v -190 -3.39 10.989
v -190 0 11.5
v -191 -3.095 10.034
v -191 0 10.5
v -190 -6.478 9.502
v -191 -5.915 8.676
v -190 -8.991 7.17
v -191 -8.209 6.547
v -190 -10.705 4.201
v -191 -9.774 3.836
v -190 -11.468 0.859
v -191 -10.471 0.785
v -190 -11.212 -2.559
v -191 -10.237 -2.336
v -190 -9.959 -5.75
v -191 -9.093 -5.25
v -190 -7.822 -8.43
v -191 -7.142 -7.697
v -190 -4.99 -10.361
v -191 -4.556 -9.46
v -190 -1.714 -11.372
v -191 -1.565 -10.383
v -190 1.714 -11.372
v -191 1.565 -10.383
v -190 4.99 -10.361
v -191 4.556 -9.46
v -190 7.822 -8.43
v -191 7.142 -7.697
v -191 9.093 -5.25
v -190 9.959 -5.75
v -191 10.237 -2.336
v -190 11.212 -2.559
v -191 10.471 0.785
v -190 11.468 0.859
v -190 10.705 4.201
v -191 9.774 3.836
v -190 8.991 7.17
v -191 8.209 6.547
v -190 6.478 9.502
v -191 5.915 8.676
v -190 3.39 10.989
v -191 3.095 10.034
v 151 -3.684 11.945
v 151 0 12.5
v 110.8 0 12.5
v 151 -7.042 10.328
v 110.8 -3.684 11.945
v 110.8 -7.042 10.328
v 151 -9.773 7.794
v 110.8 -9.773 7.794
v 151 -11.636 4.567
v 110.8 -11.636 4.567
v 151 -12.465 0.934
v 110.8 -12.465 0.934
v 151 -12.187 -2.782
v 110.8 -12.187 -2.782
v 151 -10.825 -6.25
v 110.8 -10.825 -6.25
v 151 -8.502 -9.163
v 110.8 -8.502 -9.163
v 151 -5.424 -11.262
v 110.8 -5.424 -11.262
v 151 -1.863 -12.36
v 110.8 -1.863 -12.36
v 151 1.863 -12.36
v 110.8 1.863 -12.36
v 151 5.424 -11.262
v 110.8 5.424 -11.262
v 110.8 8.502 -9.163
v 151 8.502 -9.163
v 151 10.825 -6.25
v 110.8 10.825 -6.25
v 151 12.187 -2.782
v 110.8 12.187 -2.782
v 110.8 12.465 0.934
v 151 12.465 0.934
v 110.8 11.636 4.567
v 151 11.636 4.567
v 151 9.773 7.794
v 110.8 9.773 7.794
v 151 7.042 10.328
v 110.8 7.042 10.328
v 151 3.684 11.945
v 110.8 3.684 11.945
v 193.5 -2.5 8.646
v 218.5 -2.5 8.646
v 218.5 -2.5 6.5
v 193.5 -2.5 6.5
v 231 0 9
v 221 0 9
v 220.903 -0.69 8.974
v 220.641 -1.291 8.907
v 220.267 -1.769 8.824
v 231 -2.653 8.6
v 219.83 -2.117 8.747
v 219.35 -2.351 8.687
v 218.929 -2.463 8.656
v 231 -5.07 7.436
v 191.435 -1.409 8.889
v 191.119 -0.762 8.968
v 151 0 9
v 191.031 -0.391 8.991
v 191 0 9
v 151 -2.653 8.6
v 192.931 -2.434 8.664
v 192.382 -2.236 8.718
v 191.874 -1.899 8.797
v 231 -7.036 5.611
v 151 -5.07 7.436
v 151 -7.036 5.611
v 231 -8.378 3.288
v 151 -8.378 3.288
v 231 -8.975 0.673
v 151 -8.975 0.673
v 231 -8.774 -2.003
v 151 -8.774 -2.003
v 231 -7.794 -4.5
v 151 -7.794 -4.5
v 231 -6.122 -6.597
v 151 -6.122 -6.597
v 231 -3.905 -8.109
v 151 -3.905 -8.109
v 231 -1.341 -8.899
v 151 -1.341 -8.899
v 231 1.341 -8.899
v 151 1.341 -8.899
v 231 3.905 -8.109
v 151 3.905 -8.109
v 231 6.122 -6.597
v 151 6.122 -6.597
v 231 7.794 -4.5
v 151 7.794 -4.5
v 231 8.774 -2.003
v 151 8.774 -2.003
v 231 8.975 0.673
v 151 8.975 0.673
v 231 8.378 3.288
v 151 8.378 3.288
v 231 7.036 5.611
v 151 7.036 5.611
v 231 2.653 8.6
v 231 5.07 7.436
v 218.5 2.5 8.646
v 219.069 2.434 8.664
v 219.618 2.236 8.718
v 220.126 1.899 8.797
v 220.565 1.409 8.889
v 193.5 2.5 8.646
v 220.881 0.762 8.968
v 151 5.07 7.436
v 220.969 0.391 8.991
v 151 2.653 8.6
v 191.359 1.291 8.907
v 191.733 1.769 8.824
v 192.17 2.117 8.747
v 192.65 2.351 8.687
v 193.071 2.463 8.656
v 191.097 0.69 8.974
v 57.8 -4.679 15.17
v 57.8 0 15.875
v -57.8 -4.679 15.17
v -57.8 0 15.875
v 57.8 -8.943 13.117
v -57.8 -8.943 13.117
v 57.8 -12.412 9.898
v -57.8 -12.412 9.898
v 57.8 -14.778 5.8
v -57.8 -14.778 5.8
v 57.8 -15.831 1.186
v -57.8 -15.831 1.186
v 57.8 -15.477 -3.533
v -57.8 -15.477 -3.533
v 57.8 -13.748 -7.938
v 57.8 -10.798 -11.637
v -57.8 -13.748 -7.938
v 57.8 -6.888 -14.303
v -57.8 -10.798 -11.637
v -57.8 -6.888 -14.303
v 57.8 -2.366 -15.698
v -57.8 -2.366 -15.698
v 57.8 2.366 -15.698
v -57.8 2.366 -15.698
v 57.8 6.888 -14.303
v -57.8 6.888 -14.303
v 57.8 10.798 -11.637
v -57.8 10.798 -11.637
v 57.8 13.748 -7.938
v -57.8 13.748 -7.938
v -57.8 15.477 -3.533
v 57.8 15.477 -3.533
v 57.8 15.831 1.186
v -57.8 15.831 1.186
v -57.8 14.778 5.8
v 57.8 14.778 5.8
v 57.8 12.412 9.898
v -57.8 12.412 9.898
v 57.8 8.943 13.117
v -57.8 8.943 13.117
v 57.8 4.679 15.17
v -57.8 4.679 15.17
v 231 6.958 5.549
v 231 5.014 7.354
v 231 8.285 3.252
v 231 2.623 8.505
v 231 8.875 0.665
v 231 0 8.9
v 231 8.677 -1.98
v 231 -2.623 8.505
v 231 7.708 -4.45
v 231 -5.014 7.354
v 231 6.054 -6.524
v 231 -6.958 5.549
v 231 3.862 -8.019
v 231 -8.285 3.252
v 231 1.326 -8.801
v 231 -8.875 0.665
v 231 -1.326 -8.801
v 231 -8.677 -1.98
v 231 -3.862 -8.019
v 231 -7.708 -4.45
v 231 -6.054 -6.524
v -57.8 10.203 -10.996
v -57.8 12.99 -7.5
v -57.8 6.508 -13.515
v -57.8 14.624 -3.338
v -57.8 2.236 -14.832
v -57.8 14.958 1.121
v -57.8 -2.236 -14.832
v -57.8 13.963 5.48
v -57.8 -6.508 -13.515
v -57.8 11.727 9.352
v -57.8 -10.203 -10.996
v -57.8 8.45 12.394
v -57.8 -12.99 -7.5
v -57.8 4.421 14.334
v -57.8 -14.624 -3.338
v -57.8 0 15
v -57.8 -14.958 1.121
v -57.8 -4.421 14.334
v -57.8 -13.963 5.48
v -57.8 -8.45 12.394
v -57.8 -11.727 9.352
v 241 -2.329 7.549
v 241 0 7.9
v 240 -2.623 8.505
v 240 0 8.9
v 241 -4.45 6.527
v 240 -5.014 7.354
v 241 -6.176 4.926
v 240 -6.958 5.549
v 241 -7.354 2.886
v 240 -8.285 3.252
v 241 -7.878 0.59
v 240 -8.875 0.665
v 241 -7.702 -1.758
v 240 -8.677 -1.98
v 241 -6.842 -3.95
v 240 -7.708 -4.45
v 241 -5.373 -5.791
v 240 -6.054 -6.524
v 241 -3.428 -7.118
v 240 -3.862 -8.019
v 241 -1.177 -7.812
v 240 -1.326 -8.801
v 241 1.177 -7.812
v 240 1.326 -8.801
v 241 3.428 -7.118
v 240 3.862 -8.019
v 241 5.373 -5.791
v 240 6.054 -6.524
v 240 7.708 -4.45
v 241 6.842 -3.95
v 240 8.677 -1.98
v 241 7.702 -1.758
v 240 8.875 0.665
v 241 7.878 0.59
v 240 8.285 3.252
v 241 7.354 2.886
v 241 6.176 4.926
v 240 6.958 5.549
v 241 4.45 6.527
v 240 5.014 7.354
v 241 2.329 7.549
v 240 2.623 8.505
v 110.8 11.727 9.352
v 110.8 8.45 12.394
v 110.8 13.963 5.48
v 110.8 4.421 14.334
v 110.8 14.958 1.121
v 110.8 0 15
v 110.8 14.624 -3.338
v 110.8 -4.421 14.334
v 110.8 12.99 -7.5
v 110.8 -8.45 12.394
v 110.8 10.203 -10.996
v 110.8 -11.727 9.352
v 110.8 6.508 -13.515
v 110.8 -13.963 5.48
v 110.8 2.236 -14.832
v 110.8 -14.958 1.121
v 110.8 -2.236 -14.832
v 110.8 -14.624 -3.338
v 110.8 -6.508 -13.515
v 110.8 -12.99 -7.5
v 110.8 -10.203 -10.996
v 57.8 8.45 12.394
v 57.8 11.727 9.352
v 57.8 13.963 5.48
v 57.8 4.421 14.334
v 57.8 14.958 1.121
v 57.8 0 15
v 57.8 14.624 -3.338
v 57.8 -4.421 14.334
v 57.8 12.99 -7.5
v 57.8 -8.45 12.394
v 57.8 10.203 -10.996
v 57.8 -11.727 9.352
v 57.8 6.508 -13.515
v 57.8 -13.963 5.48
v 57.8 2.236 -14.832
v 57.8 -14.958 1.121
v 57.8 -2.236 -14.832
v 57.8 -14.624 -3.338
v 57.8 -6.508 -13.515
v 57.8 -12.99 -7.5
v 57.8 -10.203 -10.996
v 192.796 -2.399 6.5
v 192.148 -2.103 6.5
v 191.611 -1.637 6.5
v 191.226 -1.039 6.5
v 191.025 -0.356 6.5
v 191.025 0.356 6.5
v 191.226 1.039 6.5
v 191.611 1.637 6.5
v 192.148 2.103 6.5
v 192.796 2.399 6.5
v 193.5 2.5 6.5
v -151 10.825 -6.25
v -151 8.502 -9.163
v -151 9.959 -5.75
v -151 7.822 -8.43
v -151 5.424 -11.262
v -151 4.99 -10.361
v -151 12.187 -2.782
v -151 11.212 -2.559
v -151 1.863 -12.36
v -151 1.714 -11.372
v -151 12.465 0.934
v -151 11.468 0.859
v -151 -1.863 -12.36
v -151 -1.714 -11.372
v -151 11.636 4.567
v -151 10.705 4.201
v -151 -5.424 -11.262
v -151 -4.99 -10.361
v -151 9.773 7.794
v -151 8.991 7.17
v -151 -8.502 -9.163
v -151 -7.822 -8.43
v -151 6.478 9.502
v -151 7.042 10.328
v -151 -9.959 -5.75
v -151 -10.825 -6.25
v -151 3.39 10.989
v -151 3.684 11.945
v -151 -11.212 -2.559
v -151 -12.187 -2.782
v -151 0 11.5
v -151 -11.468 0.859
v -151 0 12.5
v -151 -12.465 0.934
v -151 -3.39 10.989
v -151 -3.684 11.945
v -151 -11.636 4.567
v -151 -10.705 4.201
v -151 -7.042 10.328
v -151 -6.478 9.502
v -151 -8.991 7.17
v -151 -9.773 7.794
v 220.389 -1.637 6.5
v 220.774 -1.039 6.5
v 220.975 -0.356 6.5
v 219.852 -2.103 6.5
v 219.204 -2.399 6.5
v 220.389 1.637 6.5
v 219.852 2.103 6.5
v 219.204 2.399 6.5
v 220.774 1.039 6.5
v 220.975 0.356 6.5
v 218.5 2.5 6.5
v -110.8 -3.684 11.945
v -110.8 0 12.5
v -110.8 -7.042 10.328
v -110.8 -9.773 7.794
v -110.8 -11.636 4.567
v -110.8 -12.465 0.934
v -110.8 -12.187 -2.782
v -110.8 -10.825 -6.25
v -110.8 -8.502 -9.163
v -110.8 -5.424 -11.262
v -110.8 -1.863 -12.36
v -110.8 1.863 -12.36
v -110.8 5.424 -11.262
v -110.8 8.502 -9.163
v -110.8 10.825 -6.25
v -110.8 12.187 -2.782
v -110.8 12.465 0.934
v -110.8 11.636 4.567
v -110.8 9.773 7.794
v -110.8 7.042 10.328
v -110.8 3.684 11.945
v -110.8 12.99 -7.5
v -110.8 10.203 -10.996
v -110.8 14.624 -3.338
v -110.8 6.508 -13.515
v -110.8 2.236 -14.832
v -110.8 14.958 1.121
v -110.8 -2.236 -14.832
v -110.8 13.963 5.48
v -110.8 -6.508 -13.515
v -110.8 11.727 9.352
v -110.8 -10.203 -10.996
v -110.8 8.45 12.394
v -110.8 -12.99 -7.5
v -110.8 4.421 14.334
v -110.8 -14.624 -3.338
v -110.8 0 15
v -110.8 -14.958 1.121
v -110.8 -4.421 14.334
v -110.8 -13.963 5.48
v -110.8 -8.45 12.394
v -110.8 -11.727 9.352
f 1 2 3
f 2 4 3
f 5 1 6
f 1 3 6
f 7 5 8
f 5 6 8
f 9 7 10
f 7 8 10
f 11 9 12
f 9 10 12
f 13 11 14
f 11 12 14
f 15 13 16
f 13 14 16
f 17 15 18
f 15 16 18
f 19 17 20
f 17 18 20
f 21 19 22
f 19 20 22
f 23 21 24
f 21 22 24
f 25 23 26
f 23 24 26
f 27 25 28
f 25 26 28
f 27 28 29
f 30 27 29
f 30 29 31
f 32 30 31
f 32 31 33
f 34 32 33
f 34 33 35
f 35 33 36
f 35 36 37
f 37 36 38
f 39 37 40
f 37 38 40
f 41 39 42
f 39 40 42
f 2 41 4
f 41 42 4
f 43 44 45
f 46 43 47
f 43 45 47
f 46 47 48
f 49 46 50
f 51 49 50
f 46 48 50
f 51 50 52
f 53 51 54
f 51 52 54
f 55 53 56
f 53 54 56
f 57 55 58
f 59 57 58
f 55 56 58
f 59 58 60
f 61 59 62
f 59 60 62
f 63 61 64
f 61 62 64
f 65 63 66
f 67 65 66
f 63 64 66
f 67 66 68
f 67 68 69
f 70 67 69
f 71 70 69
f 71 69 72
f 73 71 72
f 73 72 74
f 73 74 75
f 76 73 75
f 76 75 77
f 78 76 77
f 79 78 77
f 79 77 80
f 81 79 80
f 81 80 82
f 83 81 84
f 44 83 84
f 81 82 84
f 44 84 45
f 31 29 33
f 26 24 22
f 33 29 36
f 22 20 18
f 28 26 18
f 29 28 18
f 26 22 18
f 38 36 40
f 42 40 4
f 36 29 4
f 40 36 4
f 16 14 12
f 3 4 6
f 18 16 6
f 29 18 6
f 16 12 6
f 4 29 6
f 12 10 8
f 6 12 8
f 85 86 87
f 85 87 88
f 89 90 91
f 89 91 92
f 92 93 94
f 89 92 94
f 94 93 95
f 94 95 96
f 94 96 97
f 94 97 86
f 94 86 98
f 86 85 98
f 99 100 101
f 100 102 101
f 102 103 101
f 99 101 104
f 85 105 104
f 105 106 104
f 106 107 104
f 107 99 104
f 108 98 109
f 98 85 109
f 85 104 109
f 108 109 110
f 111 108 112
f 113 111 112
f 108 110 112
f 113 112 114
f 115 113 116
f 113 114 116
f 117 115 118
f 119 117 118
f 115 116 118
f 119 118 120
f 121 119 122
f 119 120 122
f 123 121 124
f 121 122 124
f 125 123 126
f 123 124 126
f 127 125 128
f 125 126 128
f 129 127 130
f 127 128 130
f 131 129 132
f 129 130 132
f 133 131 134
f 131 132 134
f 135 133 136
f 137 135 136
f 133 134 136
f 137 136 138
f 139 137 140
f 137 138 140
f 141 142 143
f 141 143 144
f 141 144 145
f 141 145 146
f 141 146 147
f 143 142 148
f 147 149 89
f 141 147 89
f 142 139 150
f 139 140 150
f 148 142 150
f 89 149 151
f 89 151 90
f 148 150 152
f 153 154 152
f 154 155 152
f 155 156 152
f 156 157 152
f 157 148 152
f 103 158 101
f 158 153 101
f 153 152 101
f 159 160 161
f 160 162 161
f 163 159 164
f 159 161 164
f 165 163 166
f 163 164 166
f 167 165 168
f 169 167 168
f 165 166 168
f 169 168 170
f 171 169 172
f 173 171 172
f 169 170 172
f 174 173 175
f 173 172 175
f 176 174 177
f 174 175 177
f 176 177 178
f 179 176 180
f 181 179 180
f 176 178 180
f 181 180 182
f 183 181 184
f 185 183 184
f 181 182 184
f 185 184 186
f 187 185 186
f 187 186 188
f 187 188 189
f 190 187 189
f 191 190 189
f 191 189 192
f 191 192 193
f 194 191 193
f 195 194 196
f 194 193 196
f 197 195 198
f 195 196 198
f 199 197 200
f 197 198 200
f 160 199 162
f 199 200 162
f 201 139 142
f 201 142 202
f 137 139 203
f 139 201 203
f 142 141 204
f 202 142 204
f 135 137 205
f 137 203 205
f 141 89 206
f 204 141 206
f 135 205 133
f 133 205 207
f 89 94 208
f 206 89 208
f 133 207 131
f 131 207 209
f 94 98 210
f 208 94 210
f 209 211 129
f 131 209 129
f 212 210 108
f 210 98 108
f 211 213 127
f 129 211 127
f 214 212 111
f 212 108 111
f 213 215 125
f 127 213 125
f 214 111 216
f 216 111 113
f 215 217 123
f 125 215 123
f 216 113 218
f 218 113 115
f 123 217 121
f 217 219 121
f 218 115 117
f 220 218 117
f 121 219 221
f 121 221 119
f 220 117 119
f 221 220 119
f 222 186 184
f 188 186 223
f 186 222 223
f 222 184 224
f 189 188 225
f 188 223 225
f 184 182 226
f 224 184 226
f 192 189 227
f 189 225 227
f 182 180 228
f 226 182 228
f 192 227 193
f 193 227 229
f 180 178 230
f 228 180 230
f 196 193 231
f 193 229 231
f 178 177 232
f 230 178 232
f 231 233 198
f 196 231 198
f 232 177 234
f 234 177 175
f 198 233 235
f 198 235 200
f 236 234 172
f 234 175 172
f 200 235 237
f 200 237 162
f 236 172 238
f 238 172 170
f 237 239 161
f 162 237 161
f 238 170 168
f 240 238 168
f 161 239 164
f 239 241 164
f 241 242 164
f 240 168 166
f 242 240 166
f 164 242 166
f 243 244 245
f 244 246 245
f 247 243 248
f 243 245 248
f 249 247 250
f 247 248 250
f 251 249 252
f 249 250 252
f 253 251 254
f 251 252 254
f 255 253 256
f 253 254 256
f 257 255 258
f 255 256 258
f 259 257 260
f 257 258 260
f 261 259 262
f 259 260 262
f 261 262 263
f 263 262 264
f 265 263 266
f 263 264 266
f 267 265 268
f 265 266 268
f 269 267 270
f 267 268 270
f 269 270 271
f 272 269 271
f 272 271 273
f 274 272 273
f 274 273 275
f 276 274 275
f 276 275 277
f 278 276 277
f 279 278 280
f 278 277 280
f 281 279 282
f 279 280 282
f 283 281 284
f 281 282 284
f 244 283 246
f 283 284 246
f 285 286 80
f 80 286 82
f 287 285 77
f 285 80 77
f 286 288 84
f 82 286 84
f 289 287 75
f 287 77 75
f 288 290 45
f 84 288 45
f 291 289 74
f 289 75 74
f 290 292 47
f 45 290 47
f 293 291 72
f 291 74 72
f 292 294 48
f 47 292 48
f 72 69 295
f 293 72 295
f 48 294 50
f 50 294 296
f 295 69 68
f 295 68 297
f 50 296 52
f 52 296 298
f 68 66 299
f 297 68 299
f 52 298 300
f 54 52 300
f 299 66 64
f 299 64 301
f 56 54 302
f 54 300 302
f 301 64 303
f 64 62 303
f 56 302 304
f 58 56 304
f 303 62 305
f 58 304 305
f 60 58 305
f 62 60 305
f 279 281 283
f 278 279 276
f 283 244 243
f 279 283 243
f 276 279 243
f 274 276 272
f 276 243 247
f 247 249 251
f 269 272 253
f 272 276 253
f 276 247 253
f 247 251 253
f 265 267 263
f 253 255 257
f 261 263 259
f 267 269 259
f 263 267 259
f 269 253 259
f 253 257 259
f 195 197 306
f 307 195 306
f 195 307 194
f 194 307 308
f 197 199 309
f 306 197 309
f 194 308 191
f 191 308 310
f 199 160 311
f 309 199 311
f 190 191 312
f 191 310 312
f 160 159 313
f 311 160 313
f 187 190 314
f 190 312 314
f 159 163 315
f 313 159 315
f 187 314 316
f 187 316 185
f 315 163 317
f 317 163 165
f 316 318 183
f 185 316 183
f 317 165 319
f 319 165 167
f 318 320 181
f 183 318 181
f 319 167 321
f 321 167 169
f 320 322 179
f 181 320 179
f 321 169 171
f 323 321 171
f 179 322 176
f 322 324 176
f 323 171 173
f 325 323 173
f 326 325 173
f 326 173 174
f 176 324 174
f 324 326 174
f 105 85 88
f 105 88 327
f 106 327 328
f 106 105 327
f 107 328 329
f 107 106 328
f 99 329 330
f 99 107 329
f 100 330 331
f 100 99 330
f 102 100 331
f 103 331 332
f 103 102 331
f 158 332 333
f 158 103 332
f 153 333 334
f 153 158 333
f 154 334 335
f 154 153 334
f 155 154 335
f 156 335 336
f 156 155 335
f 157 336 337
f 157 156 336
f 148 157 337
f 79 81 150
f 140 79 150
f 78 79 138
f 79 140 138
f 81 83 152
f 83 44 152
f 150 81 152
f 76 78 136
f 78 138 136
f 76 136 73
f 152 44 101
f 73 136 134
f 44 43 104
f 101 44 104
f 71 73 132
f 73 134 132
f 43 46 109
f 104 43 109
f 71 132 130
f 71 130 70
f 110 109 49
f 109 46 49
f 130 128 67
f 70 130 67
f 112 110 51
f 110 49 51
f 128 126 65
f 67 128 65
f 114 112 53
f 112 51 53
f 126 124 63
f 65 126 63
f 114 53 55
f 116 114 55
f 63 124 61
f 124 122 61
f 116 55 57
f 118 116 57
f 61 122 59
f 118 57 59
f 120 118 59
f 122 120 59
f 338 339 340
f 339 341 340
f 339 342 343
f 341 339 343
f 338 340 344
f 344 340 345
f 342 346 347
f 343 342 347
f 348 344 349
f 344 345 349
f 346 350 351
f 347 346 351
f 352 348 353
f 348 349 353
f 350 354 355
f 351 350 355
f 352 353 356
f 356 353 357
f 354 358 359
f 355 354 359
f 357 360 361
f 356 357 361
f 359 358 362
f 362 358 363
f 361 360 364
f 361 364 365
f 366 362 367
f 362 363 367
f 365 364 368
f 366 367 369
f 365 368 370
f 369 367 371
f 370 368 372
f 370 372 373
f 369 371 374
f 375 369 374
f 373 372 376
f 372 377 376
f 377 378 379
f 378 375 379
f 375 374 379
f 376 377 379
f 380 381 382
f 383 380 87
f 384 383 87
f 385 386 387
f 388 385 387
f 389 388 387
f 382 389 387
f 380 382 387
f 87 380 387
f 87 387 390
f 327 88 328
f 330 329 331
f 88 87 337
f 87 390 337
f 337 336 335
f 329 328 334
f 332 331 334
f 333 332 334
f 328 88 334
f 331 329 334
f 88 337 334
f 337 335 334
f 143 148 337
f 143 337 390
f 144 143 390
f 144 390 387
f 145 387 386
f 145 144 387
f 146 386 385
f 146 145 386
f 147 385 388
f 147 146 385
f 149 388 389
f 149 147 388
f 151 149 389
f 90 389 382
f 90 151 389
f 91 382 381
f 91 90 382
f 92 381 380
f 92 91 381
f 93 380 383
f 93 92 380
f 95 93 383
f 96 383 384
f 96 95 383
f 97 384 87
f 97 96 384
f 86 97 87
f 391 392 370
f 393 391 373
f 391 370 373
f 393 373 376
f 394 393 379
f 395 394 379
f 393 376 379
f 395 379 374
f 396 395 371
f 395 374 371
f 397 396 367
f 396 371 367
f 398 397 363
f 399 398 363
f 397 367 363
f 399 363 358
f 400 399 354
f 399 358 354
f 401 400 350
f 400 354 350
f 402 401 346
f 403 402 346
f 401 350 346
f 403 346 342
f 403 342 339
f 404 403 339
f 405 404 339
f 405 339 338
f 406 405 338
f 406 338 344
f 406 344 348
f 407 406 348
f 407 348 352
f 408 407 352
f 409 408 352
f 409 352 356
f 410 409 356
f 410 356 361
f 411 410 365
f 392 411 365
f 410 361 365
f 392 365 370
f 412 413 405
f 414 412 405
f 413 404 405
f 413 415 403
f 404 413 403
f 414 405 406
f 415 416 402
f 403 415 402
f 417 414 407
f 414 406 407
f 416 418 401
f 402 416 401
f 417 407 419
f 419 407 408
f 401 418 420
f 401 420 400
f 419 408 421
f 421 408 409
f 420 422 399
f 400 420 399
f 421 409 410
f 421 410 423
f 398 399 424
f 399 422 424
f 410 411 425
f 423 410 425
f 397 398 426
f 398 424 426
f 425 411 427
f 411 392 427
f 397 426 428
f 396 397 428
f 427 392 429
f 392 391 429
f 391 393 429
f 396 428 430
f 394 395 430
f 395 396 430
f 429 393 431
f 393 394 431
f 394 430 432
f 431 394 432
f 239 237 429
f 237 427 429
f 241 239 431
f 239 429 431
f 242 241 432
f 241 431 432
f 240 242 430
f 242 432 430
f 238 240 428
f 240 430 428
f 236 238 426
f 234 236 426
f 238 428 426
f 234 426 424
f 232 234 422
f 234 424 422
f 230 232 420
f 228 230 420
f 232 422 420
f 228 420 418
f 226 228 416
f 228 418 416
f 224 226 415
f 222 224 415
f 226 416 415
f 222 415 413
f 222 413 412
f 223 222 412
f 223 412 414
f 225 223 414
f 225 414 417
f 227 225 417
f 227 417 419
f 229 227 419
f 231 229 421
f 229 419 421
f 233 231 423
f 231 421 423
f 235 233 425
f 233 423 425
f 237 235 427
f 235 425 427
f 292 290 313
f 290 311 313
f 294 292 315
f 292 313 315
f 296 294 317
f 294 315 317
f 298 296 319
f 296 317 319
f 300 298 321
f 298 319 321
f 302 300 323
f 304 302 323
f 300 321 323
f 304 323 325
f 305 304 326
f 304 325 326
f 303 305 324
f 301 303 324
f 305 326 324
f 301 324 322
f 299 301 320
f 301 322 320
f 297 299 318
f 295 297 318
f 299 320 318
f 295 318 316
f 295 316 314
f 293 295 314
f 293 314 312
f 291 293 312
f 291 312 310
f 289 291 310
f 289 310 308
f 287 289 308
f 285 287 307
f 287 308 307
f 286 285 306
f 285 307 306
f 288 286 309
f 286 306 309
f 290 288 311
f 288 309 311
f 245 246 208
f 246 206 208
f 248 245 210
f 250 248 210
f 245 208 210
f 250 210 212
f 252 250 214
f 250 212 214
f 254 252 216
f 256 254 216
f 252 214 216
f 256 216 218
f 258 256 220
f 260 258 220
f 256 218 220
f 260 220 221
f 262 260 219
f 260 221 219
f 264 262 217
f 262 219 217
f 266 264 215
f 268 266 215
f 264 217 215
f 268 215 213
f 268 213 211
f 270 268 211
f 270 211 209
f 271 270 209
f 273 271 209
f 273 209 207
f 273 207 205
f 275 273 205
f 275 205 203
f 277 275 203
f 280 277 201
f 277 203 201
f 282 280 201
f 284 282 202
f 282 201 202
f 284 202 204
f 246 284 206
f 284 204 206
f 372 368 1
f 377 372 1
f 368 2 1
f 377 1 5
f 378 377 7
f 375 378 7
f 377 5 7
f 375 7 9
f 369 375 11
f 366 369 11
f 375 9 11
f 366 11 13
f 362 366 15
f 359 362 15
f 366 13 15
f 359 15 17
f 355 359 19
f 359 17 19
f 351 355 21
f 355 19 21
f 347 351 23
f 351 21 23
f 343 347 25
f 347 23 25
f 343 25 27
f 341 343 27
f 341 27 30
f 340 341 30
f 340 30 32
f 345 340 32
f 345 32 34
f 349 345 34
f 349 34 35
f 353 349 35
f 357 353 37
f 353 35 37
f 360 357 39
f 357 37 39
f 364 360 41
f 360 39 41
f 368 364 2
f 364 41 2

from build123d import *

# Parameters (mm, degrees)
CUT_EXTRUDE_START   = 9
CUT_EXTRUDE_1_DEPTH = 2.5


with BuildPart() as part:
    # 草圖1 → 旋轉1 (revolve)
    with BuildSketch(Plane.XY, mode=Mode.PRIVATE) as revolve_1_sk:
        Polygon((57.8, 15.875), (-57.8, 15.875), (-57.8, 15), (-110.8, 15), (-110.8, 12.5), (-151, 12.5), (-151, 11.5), (-190, 11.5), (-191, 10.5), (-191, 0), (241, 0), (241, 7.9), (240, 8.9), (231, 8.9), (231, 9), (151, 9), (151, 12.5), (110.8, 12.5), (110.8, 15), (57.8, 15), align=None)
    revolve(revolve_1_sk.sketch.rotate(Axis((0, 0, 0), (1, 0, 0)), 90), axis=Axis((0, 0, 0), (1, 0, 0)))

    # 草圖2 → 除料-伸長1 (cut)
    with BuildSketch(Plane.XY.offset(CUT_EXTRUDE_START)):
        with BuildLine():
            Line((193.5, 2.5), (218.5, 2.5))
            ThreePointArc((218.5, 2.5), (221, 0), (218.5, -2.5))
            Line((218.5, -2.5), (193.5, -2.5))
            ThreePointArc((193.5, -2.5), (191, 0), (193.5, 2.5))
        make_face()
    extrude(amount=-CUT_EXTRUDE_1_DEPTH, mode=Mode.SUBTRACT)


solid = part.part
